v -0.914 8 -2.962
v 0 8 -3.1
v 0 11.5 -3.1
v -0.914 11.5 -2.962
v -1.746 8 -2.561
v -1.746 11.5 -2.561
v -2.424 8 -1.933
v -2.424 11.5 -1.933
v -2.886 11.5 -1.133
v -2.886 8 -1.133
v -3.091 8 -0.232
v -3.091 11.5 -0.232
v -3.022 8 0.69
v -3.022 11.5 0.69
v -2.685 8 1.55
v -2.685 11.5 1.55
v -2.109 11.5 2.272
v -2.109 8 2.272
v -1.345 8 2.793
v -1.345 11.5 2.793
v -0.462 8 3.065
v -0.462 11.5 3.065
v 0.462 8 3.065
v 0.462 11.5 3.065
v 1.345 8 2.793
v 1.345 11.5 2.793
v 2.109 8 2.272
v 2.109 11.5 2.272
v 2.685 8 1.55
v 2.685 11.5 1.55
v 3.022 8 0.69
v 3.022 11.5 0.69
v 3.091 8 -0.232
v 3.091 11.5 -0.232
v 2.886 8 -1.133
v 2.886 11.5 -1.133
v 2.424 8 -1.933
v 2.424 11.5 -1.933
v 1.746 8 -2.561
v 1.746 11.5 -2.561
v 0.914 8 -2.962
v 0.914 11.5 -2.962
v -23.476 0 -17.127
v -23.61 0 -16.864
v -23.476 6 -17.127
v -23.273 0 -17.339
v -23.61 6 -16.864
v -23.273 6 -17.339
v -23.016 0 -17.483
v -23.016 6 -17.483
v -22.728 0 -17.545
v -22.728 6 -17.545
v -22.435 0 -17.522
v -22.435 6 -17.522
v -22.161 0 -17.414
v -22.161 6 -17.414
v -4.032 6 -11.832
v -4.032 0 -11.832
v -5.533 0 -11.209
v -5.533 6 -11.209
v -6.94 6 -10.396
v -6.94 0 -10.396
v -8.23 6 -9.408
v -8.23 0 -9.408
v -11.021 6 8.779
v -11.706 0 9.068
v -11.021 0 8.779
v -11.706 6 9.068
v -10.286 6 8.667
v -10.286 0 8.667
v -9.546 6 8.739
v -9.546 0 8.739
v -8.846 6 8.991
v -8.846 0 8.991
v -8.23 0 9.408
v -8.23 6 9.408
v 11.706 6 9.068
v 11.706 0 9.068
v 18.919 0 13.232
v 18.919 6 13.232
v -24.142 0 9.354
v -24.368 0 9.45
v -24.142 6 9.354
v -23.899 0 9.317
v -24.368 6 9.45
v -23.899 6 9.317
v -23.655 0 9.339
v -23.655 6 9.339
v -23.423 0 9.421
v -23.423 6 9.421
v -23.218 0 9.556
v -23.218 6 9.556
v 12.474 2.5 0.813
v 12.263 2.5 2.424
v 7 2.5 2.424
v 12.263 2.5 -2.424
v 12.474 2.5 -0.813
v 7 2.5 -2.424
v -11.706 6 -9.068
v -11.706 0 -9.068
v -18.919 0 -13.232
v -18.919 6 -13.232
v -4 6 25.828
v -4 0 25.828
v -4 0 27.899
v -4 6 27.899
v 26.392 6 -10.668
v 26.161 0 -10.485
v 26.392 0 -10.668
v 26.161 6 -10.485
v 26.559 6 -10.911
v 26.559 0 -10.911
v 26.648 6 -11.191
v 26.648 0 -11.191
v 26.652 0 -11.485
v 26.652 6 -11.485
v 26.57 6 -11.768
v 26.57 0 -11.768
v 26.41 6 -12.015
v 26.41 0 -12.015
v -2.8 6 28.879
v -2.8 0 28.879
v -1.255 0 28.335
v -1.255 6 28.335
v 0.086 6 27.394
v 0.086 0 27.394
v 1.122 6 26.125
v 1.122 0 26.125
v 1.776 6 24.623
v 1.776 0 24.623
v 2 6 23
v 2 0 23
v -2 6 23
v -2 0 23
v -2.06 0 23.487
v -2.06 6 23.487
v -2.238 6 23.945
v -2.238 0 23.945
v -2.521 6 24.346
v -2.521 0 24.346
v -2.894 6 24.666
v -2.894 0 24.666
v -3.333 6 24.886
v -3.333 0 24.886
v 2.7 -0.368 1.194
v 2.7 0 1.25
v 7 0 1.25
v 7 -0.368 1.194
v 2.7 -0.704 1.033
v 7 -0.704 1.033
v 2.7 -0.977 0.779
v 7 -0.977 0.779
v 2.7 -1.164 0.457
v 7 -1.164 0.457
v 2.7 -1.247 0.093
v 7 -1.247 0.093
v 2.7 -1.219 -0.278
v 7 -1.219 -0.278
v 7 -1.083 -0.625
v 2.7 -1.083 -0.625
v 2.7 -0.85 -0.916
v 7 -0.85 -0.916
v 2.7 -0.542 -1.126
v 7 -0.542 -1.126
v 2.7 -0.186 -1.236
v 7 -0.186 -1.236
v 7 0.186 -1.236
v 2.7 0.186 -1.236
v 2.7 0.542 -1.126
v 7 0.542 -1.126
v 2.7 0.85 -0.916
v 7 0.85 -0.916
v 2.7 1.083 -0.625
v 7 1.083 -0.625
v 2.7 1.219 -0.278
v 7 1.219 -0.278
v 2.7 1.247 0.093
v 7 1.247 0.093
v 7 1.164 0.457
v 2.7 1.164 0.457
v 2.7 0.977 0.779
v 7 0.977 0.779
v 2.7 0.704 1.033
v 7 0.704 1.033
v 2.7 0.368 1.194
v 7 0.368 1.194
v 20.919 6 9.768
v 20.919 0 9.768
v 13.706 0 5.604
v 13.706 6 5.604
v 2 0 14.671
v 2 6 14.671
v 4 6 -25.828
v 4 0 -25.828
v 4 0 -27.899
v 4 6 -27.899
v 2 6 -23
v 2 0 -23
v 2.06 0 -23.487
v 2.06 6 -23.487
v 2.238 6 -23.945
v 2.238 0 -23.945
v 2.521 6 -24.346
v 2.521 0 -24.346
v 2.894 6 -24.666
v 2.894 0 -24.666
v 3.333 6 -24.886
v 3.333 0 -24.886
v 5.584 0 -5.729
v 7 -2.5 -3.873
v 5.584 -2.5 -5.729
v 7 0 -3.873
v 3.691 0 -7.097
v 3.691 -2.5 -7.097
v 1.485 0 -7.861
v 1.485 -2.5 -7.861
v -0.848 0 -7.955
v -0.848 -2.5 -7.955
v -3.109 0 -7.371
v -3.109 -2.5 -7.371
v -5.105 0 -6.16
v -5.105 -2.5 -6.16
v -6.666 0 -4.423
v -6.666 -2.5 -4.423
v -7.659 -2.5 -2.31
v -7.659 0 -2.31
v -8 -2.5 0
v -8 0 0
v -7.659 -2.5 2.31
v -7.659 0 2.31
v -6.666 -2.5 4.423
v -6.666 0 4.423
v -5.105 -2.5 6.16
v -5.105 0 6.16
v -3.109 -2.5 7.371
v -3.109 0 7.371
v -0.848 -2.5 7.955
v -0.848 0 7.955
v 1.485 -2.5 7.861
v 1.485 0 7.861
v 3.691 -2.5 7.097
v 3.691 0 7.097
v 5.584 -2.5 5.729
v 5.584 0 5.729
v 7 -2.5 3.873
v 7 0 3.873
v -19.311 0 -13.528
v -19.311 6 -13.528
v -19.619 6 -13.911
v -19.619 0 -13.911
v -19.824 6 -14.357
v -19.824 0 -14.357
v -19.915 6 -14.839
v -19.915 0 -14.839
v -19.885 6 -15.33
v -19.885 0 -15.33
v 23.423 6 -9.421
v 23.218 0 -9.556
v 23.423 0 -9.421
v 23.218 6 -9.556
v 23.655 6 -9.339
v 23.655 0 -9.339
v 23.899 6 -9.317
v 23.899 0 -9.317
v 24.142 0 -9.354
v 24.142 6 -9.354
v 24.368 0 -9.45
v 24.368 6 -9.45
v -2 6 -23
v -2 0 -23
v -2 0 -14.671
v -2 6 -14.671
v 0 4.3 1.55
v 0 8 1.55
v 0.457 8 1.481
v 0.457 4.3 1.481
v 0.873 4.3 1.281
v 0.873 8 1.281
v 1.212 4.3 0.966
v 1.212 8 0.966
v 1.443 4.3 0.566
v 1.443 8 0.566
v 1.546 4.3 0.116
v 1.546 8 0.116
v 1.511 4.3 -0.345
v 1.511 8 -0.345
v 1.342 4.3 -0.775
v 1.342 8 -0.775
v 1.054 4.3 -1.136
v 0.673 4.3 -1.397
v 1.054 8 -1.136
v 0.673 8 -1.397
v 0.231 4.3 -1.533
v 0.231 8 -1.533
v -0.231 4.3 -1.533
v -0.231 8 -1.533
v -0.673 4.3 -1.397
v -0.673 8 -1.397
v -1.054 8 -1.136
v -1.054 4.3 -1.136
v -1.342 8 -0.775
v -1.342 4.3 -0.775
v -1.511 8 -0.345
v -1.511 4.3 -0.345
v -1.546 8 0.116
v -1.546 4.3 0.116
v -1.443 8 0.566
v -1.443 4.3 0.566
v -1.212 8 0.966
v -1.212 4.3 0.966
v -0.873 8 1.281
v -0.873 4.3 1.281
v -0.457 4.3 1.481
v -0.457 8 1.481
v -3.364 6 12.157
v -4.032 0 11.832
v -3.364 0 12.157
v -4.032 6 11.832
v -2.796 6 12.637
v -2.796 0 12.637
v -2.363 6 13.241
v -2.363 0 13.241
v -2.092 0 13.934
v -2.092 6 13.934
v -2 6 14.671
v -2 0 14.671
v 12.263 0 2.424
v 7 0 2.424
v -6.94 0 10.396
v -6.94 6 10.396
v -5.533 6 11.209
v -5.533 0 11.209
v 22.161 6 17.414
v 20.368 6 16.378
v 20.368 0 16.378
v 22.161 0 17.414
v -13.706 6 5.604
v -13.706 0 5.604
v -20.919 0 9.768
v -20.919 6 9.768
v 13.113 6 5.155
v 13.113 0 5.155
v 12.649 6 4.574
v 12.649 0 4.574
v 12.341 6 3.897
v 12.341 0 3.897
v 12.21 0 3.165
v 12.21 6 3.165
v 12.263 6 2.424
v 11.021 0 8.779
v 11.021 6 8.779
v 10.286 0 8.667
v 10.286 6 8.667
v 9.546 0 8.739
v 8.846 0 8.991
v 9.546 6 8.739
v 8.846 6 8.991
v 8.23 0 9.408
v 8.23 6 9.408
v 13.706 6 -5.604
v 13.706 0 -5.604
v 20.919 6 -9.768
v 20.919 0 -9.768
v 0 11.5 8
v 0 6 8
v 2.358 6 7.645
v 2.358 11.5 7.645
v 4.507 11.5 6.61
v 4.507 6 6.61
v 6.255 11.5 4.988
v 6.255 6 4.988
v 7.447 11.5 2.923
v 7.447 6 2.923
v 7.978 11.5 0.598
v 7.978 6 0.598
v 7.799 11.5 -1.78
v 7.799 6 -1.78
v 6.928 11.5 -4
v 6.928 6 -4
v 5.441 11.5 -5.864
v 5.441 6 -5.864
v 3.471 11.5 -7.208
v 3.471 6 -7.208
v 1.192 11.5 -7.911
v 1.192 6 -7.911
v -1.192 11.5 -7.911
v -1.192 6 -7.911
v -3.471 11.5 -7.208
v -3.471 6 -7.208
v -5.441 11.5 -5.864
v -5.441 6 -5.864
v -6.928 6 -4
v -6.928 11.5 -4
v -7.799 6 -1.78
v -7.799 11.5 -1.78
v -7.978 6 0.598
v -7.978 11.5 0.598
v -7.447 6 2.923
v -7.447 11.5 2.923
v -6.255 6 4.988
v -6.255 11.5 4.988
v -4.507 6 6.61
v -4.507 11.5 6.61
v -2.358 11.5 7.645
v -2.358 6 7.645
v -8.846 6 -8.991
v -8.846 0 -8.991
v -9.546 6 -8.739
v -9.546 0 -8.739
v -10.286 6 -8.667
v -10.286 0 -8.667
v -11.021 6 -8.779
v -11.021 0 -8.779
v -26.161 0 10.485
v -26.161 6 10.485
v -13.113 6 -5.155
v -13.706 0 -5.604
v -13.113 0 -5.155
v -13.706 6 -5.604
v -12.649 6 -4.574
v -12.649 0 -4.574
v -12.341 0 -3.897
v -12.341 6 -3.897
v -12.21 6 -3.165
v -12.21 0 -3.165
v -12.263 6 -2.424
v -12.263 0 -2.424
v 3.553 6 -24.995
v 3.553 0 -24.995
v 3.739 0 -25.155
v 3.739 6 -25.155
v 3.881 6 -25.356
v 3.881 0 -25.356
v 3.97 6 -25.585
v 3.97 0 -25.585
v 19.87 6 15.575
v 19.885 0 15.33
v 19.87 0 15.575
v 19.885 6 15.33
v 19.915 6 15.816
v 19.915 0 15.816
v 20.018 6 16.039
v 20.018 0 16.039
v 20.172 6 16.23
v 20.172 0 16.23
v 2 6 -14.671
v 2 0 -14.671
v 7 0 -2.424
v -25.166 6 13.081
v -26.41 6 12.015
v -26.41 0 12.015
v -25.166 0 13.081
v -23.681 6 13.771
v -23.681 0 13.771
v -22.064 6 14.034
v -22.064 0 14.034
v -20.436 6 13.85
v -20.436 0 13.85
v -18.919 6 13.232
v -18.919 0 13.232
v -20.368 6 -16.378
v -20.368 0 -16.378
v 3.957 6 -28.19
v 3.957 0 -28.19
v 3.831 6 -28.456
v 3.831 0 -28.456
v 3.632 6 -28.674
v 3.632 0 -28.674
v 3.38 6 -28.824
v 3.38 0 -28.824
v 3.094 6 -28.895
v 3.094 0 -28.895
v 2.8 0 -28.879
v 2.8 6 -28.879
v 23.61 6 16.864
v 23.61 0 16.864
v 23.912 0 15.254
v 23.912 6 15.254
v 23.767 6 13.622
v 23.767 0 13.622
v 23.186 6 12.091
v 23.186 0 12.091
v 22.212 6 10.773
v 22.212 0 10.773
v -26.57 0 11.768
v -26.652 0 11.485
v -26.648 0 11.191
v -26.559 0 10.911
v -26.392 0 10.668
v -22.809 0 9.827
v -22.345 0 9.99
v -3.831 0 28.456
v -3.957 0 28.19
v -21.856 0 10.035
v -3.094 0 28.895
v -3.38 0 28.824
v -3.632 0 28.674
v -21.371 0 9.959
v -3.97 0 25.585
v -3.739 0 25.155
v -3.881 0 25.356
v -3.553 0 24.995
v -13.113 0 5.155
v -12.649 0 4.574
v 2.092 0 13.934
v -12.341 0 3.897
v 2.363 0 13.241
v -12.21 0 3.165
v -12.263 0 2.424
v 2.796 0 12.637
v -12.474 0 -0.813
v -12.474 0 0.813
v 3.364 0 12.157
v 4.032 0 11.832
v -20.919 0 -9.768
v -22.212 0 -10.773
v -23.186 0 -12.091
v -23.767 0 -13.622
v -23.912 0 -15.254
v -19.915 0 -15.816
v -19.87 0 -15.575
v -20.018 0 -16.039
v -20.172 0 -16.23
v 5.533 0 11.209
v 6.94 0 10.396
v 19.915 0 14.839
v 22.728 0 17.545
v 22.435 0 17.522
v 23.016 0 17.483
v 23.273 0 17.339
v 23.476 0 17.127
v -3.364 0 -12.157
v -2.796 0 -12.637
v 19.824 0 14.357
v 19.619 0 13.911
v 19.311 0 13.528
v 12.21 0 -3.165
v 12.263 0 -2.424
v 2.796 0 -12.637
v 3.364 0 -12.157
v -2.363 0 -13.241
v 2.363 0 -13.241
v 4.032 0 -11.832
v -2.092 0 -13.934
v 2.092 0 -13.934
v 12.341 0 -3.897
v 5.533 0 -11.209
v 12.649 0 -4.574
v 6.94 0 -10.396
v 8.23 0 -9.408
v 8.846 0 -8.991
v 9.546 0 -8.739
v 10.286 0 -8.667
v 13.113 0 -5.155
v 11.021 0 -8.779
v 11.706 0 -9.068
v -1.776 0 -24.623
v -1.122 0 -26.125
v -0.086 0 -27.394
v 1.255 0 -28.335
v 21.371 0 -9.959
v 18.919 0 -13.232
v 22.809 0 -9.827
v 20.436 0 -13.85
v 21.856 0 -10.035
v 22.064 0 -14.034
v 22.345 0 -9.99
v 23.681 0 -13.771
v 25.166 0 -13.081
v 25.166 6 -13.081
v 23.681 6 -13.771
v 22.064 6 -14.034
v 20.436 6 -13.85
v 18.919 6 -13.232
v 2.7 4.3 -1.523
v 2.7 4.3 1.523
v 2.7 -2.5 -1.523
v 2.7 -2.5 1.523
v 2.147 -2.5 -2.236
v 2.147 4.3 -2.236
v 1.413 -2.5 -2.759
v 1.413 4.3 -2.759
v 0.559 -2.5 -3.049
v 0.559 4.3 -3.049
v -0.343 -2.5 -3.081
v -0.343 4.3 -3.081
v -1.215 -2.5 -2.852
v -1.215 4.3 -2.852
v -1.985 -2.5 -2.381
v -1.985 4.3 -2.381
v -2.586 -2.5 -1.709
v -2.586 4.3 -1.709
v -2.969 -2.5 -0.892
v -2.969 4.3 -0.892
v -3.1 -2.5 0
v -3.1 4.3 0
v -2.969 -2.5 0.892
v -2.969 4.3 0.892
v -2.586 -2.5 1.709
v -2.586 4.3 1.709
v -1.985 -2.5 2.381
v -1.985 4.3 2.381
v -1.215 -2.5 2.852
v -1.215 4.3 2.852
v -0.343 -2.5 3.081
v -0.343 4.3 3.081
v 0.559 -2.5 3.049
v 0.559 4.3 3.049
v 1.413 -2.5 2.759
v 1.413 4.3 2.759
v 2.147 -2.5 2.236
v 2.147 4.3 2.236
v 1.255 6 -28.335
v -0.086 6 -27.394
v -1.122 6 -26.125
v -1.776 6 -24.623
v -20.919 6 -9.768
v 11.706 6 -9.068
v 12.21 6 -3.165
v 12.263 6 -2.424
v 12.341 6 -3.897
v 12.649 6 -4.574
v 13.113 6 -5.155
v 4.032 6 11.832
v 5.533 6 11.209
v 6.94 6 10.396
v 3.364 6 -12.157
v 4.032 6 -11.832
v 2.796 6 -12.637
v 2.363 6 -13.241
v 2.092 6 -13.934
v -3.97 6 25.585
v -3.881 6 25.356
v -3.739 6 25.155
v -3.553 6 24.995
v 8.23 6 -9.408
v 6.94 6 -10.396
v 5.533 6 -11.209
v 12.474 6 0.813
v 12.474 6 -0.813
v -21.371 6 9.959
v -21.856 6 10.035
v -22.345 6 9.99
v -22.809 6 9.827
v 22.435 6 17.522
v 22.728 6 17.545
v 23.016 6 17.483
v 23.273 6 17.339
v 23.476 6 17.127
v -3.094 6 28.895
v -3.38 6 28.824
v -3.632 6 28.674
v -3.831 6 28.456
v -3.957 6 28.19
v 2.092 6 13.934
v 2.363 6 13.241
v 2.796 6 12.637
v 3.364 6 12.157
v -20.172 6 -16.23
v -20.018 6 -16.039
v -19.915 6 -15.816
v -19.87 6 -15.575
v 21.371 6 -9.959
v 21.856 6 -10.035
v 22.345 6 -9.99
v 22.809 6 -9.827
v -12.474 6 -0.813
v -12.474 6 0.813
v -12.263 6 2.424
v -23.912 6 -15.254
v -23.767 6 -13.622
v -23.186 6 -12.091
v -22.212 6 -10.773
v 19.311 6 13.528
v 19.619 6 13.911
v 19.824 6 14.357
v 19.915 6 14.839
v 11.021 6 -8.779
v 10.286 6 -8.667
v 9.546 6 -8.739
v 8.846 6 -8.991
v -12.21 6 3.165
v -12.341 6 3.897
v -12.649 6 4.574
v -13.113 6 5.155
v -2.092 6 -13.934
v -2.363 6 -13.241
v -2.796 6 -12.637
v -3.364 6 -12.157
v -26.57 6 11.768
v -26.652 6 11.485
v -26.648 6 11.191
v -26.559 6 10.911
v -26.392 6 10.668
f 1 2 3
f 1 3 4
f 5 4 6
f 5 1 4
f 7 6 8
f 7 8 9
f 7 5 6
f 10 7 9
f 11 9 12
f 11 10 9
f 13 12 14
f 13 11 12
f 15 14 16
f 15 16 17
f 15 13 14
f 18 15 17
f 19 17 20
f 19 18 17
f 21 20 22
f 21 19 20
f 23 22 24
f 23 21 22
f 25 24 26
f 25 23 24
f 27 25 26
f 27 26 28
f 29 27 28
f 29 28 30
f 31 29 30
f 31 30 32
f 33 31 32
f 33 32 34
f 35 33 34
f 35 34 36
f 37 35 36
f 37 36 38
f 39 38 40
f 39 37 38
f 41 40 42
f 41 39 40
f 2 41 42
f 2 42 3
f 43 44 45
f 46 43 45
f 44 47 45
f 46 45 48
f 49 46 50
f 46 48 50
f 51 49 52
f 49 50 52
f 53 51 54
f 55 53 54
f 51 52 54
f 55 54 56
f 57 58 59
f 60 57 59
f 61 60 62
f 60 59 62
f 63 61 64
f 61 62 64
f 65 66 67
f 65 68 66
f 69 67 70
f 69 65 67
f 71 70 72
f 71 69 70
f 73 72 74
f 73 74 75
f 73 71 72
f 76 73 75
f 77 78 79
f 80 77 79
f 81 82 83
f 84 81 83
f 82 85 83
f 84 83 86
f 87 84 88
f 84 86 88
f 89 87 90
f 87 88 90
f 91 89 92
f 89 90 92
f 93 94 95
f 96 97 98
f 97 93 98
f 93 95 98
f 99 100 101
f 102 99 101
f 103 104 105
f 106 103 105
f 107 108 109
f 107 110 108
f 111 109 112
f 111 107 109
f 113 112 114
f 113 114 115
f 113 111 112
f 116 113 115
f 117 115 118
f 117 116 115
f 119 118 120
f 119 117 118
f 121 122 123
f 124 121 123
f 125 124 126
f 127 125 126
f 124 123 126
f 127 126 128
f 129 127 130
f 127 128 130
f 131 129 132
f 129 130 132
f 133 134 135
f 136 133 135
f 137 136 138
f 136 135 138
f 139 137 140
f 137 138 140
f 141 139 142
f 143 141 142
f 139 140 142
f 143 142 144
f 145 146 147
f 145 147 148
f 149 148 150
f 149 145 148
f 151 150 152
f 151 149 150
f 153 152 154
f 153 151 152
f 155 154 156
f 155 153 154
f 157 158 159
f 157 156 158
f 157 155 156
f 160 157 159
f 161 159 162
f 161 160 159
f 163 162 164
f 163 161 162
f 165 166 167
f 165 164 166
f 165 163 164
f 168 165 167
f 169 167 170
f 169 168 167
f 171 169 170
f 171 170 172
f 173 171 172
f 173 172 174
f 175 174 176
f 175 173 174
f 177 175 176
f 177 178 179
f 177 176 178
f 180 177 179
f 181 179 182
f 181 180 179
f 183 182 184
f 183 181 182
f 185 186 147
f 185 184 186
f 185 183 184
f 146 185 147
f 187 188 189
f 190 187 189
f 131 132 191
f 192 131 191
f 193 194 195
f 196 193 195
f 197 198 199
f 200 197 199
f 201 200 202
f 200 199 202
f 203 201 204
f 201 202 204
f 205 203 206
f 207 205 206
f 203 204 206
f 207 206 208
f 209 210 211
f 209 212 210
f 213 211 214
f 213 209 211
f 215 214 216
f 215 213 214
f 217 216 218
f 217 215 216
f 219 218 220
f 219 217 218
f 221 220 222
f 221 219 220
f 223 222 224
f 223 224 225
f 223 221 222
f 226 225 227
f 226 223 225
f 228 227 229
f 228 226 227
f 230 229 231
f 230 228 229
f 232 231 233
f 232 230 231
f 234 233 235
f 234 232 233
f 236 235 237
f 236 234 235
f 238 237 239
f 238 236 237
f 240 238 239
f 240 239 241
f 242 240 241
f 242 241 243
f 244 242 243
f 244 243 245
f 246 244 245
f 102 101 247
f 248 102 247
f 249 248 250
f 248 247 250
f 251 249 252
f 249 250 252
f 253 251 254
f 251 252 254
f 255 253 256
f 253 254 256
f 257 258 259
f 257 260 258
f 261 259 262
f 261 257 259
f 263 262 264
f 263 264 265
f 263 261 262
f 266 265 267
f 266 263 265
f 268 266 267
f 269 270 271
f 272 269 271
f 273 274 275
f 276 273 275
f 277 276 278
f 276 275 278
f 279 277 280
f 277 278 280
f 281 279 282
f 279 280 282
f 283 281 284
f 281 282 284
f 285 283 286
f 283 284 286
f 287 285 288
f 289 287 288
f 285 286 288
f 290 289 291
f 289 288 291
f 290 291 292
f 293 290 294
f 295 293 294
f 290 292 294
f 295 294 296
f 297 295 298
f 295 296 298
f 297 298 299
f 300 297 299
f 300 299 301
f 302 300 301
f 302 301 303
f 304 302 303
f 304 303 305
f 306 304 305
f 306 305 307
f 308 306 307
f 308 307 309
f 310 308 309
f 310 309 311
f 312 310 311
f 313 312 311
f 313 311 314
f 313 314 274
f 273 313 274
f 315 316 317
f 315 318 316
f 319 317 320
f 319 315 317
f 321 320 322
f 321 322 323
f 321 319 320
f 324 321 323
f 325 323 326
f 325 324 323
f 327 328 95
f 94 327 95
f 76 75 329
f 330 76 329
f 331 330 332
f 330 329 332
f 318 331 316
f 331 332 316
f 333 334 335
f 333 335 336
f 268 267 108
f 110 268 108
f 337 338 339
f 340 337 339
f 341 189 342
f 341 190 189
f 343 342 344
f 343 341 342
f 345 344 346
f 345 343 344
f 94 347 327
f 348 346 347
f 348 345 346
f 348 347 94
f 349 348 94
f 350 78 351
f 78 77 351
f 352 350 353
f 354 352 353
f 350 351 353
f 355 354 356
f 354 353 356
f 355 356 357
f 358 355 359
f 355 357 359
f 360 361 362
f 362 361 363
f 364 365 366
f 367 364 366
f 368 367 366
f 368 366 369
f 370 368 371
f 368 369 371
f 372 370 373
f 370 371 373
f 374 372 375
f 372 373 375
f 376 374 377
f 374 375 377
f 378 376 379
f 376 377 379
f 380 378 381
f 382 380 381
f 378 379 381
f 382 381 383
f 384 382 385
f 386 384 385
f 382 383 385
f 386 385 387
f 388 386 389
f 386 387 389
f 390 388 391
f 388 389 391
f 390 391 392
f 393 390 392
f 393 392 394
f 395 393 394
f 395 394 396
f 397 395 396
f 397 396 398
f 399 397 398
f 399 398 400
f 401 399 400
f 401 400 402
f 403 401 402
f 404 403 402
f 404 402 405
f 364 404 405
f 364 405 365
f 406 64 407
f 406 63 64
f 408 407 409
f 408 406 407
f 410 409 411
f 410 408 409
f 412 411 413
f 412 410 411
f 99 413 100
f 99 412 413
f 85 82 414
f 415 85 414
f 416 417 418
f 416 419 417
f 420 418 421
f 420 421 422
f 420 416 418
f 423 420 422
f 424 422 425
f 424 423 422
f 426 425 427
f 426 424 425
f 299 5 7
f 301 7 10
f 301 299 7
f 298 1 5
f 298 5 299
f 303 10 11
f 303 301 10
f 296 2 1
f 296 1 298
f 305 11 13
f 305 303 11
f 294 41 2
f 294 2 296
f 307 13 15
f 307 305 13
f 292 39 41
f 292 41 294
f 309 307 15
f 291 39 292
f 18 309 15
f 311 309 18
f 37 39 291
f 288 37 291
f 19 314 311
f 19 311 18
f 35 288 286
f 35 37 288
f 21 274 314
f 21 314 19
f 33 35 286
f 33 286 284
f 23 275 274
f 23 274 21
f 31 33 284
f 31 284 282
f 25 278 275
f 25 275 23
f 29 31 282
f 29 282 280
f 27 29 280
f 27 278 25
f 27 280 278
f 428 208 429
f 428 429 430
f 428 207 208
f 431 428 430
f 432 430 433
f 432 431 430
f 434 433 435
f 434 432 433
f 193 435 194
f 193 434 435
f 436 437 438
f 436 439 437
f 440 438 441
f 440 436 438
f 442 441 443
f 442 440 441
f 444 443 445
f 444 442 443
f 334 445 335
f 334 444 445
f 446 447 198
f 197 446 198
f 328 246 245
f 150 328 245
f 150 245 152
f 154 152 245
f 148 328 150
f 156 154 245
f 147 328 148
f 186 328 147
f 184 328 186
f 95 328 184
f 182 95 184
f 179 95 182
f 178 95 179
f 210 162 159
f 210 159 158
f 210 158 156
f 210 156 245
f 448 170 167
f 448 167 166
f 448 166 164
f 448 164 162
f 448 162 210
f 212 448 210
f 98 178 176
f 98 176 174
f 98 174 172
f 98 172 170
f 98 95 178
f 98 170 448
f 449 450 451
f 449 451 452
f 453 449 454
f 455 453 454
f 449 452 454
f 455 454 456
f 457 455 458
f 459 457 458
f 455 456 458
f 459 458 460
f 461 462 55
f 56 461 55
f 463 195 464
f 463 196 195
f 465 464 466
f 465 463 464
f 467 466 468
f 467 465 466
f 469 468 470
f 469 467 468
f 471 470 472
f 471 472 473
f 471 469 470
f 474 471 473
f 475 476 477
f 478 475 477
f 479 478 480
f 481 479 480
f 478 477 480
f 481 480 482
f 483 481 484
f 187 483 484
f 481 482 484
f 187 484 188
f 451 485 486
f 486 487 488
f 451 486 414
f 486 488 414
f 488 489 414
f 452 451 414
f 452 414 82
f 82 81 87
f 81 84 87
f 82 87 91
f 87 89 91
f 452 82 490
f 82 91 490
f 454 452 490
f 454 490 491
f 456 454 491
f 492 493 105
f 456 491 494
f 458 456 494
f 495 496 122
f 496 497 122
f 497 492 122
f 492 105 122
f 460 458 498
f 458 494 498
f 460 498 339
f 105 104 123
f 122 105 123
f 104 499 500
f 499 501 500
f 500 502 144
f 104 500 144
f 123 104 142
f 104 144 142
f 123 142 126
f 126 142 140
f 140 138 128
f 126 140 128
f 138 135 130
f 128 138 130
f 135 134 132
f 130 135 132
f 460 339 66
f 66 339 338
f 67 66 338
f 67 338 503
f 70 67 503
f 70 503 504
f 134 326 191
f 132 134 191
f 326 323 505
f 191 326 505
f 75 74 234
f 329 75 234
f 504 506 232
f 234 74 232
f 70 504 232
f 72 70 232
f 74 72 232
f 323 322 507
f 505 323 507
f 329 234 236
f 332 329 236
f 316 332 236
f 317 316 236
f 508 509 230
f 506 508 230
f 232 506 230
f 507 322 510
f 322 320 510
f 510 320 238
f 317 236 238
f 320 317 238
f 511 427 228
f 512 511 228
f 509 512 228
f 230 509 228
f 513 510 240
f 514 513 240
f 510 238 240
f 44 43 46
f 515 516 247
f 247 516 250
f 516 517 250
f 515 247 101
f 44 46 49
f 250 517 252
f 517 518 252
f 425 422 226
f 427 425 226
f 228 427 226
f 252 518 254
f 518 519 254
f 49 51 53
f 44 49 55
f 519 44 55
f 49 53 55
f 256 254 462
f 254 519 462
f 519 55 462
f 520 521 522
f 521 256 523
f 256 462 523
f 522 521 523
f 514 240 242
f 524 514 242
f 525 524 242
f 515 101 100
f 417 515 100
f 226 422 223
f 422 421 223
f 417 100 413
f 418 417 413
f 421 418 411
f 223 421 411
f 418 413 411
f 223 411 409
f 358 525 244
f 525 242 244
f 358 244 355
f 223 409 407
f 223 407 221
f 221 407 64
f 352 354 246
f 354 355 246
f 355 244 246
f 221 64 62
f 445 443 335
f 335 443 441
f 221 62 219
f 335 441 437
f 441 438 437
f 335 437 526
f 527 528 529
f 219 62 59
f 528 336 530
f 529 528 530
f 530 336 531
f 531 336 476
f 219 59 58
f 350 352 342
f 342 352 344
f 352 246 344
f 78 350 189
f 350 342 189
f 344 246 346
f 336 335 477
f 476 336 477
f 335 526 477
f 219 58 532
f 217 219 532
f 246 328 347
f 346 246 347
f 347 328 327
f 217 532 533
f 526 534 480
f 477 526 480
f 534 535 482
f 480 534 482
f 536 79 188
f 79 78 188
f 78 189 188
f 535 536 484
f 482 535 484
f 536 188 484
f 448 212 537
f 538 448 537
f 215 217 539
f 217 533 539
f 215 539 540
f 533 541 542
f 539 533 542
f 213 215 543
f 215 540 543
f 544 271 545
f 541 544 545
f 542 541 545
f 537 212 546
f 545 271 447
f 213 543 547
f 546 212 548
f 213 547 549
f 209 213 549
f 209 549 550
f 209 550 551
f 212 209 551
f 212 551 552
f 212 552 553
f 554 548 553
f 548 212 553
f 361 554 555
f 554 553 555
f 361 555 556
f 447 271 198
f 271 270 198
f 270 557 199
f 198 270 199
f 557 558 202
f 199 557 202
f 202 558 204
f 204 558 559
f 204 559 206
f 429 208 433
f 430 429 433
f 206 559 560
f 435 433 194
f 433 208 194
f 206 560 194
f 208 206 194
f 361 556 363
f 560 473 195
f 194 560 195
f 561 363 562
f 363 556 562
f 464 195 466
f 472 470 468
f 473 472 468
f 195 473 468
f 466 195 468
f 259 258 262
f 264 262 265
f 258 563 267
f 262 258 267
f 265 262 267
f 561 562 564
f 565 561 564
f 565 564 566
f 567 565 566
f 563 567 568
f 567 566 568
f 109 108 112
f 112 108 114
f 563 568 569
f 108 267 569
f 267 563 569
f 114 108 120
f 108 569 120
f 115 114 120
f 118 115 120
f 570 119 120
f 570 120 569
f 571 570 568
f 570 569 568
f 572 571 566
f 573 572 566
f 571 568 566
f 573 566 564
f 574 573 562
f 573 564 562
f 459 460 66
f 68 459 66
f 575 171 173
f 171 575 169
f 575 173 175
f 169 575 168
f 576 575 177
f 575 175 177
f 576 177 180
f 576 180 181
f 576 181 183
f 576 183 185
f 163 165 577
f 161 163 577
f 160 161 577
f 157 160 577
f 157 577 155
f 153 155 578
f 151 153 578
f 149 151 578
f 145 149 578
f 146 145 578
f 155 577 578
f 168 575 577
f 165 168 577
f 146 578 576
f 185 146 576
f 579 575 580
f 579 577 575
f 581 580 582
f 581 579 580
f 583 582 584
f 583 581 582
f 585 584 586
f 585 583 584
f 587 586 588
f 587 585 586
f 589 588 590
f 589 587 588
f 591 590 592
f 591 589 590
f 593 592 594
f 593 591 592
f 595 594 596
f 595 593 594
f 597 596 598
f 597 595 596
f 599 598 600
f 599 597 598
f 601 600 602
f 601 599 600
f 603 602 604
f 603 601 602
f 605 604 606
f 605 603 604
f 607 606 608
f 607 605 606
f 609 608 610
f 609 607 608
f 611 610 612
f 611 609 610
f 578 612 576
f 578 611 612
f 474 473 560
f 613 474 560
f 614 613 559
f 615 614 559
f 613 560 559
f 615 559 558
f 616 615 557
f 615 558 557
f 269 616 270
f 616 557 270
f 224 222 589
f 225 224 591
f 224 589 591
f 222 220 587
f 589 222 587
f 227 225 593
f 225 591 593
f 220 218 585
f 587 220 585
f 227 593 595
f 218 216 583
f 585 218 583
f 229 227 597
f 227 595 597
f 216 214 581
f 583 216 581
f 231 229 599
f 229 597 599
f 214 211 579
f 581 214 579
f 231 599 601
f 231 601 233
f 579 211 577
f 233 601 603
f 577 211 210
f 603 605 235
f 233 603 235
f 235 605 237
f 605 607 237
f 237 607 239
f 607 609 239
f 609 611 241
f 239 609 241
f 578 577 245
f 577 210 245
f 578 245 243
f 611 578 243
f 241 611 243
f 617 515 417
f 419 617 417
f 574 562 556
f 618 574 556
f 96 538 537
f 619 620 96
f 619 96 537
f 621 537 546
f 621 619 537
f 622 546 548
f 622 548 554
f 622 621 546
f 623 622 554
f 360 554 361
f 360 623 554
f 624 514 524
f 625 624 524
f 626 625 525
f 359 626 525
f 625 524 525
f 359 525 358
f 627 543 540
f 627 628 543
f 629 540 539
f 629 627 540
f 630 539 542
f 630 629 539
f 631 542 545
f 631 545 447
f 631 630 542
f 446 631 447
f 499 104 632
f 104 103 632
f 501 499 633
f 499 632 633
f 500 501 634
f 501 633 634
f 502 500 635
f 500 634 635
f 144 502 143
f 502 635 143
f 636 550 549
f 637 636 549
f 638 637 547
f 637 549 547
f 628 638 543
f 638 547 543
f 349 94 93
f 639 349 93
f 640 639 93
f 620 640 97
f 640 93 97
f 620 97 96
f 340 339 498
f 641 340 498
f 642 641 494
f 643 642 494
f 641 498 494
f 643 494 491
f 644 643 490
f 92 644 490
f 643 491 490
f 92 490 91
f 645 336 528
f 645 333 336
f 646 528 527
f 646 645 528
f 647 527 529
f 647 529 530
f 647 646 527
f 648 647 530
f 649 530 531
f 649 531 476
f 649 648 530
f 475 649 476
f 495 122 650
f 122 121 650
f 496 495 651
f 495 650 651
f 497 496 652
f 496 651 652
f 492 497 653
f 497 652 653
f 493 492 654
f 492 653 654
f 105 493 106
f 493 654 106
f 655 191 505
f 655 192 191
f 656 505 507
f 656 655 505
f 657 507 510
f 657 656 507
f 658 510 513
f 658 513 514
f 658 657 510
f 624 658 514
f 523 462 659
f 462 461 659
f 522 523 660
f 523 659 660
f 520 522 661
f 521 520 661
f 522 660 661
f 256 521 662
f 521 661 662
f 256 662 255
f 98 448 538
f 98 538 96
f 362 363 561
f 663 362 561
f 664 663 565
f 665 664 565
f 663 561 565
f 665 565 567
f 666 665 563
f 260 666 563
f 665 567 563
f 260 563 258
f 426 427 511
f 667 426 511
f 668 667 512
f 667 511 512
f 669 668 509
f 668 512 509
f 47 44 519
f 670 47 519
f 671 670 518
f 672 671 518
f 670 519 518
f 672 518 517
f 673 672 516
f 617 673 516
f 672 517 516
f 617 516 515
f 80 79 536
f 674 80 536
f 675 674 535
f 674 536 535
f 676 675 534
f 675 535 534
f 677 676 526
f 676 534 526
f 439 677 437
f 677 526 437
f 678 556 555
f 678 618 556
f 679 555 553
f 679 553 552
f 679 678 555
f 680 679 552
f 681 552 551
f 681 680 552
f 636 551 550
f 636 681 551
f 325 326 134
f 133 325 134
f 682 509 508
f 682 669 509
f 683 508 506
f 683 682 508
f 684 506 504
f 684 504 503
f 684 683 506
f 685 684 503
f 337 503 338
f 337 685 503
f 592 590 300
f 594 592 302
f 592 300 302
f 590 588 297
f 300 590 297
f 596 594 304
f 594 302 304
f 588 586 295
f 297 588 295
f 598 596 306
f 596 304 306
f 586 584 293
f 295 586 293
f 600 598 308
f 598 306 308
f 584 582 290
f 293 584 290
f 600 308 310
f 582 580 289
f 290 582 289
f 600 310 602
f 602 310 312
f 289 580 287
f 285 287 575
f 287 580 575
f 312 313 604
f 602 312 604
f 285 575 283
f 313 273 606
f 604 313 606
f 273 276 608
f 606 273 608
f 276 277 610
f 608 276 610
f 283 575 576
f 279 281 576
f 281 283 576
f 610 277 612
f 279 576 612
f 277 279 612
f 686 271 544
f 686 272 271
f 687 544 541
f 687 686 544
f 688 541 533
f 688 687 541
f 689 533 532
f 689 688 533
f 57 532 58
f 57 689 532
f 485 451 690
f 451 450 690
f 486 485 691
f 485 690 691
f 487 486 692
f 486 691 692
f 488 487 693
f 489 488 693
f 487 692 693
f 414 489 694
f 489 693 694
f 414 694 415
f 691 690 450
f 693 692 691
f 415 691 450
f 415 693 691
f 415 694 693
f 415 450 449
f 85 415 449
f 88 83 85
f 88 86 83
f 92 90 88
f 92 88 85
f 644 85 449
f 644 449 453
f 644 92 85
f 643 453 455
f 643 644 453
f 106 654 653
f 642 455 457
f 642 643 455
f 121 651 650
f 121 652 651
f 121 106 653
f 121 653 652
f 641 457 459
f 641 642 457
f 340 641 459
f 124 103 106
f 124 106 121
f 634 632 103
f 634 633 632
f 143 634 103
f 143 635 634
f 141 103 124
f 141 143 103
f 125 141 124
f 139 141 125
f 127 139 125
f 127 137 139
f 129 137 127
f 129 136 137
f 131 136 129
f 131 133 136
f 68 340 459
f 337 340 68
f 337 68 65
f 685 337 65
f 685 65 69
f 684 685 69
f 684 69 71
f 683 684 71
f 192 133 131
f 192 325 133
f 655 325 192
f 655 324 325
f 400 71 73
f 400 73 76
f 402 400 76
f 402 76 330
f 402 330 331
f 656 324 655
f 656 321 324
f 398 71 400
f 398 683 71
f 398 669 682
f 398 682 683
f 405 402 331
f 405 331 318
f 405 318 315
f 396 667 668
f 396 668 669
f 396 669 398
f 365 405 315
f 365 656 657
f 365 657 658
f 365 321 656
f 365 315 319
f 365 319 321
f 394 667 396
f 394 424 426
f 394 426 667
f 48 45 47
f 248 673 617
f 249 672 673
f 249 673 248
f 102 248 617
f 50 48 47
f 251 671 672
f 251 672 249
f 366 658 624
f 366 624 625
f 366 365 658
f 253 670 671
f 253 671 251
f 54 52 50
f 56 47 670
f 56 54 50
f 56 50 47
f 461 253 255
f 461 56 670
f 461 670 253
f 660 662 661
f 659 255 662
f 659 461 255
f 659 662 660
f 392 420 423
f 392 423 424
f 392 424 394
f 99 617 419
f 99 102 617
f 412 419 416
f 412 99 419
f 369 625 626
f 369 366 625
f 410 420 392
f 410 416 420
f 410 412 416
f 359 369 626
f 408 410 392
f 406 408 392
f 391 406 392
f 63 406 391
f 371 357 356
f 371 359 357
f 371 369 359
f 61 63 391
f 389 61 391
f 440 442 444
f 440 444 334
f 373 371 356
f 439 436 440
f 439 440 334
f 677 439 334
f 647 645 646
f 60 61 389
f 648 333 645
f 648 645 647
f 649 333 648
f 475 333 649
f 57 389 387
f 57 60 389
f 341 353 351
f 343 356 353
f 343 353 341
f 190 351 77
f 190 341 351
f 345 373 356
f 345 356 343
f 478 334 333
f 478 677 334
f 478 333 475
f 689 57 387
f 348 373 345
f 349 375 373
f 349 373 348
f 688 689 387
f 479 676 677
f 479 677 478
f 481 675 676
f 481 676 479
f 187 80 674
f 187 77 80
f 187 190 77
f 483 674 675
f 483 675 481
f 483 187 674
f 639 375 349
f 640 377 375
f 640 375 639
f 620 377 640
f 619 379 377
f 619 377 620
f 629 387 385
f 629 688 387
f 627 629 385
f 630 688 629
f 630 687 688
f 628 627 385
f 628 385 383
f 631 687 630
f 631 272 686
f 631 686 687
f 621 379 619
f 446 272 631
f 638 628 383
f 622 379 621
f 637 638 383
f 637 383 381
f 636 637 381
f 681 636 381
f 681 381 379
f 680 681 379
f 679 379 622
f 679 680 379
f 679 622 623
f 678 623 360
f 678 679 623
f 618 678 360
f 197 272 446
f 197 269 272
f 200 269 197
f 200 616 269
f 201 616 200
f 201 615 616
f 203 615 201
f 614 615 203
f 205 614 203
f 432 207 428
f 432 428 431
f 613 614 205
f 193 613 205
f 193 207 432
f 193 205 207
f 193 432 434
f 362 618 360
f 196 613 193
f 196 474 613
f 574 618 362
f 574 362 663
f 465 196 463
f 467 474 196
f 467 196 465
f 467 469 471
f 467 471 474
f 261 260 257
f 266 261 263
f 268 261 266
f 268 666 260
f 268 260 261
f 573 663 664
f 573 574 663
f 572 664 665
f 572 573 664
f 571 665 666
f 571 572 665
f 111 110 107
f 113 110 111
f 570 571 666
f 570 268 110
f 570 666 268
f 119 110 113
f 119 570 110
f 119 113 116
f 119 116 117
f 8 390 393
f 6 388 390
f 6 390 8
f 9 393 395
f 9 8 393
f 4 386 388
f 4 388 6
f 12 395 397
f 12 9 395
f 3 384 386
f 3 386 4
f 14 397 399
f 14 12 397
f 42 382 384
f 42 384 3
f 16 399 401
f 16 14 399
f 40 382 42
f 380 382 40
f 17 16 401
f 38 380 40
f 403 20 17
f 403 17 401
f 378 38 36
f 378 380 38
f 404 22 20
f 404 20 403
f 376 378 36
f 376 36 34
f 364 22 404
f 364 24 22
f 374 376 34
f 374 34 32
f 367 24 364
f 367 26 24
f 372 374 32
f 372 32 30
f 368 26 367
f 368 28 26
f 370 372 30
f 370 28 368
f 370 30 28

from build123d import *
from build123d.topology import SkipClean

# Parameters (mm, degrees)
EXTRUDE_1_DEPTH      = 6
FILLET_1_R           = 3
FILLET_2_R           = 1
SKETCH_2_R           = 8
EXTRUDE_2_DEPTH      = 2.5
SKETCH_3_R           = 3.1
CUT_EXTRUDE_1_DEPTH  = 41.227129309
SKETCH_5_R           = 8
SKETCH_5_R_2         = 3.1
EXTRUDE_3_DEPTH      = 1.5
SKETCH_6_R           = 8
SKETCH_6_R_2         = 1.25
EXTRUDE_4_DEPTH      = 0.5
SKETCH_7_R           = 8
SKETCH_7_R_2         = 3.1
EXTRUDE_5_DEPTH      = 3.5
EXTRUDE_START        = -3.2
SKETCH_6_2_R         = 8
SKETCH_6_2_R_2       = 1.25
EXTRUDE_6_DEPTH      = 3.2
SKETCH_12_W          = 16
SKETCH_12_H          = 5
CUT_EXTRUDE_7_DEPTH  = 46.830983865
EXTRUDE_7_REACH      = 43.737
SKETCH_16_W          = 0.8
SKETCH_16_H          = 4
SKETCH_14_R          = 1.25
CUT_EXTRUDE_8_DEPTH  = 41.966107118
SKETCH_15_W          = 4.847698962
SKETCH_15_H          = 5
CUT_EXTRUDE_9_DEPTH  = 46.830983865
CUT_EXTRUDE_10_REACH = 42.697
SKETCH_17_R          = 1.55


with BuildPart() as part:
    # 草图1 → 凸台-拉伸1 (new body)
    with BuildSketch(Plane(origin=(0, 0, 0), x_dir=(1, 0, 0), z_dir=(0, 1, 0))):
        with BuildLine():
            Line((2, 12.338962679), (2, 23))
            ThreePointArc((2, 23), (2.585786438, 24.414213562), (4, 25))
            Line((4, 25), (4, 29))
            ThreePointArc((4, 29), (-0.242640687, 27.242640687), (-2, 23))
            Line((-2, 23), (-2, 12.338962679))
            ThreePointArc((-2, 12.338962679), (-6.25, 10.825317547), (-9.685855137, 7.901532147))
            Line((-9.685855137, 7.901532147), (-18.918584287, 13.232050808))
            ThreePointArc((-18.918584287, 13.232050808), (-19.85043594, 14.446463525), (-19.650635095, 15.964101615))
            Line((-19.650635095, 15.964101615), (-23.11473671, 17.964101615))
            ThreePointArc((-23.11473671, 17.964101615), (-23.714139245, 13.411187345), (-20.918584287, 9.767949192))
            Line((-20.918584287, 9.767949192), (-11.685855137, 4.437430532))
            ThreePointArc((-11.685855137, 4.437430532), (-12.5, 0), (-11.685855137, -4.437430532))
            Line((-11.685855137, -4.437430532), (-20.918584287, -9.767949192))
            ThreePointArc((-20.918584287, -9.767949192), (-22.436222377, -9.967750037), (-23.650635095, -9.035898385))
            Line((-23.650635095, -9.035898385), (-27.11473671, -11.035898385))
            ThreePointArc((-27.11473671, -11.035898385), (-23.471498558, -13.831453343), (-18.918584287, -13.232050808))
            Line((-18.918584287, -13.232050808), (-9.685855137, -7.901532147))
            ThreePointArc((-9.685855137, -7.901532147), (-6.25, -10.825317547), (-2, -12.338962679))
            Line((-2, -12.338962679), (-2, -23))
            ThreePointArc((-2, -23), (-2.585786438, -24.414213562), (-4, -25))
            Line((-4, -25), (-4, -29))
            ThreePointArc((-4, -29), (0.242640687, -27.242640687), (2, -23))
            Line((2, -23), (2, -12.338962679))
            ThreePointArc((2, -12.338962679), (6.25, -10.825317547), (9.685855137, -7.901532147))
            Line((9.685855137, -7.901532147), (18.918584287, -13.232050808))
            ThreePointArc((18.918584287, -13.232050808), (19.85043594, -14.446463525), (19.650635095, -15.964101615))
            Line((19.650635095, -15.964101615), (23.11473671, -17.964101615))
            ThreePointArc((23.11473671, -17.964101615), (23.714139245, -13.411187345), (20.918584287, -9.767949192))
            Line((20.918584287, -9.767949192), (11.685855137, -4.437430532))
            ThreePointArc((11.685855137, -4.437430532), (12.5, 0), (11.685855137, 4.437430532))
            Line((11.685855137, 4.437430532), (20.918584287, 9.767949192))
            ThreePointArc((20.918584287, 9.767949192), (22.436222377, 9.967750037), (23.650635095, 9.035898385))
            Line((23.650635095, 9.035898385), (27.11473671, 11.035898385))
            ThreePointArc((27.11473671, 11.035898385), (23.471498558, 13.831453343), (18.918584287, 13.232050808))
            Line((18.918584287, 13.232050808), (9.685855137, 7.901532147))
            ThreePointArc((9.685855137, 7.901532147), (6.25, 10.825317547), (2, 12.338962679))
        make_face()
    extrude(amount=EXTRUDE_1_DEPTH)

    # 圆角1
    fillet_1_edges = [part.edges().sort_by_distance(p)[0] for p in [
        (9.685855137, 3, -7.901532147),
        (2, 3, -12.338962679),
        (-2, 3, -12.338962679),
        (-9.685855137, 3, -7.901532147),
        (-11.685855137, 3, -4.437430532),
        (-11.685855137, 3, 4.437430532),
        (-9.685855137, 3, 7.901532147),
        (-2, 3, 12.338962679),
        (2, 3, 12.338962679),
        (11.685855137, 3, 4.437430532),
        (9.685855137, 3, 7.901532147),
        (11.685855137, 3, -4.437430532),
    ]]
    fillet(fillet_1_edges, radius=FILLET_1_R)

    # 圆角2
    fillet_2_edges = [part.edges().sort_by_distance(p)[0] for p in [
        (-4, 3, 25),
        (-27.11473671, 3, 11.035898385),
        (-23.650635095, 3, 9.035898385),
        (-23.11473671, 3, -17.964101615),
        (-19.650635095, 3, -15.964101615),
        (4, 3, -29),
        (4, 3, -25),
        (27.11473671, 3, -11.035898385),
        (23.650635095, 3, -9.035898385),
        (19.650635095, 3, 15.964101615),
        (23.11473671, 3, 17.964101615),
        (-4, 3, 29),
    ]]
    fillet(fillet_2_edges, radius=FILLET_2_R)

    # 草图2 → 凸台-拉伸2 (add)
    with BuildSketch(Plane(origin=(0, 0, 0), x_dir=(1, 0, 0), z_dir=(0, 1, 0))):
        Circle(SKETCH_2_R)
    extrude(amount=-EXTRUDE_2_DEPTH)

    # 草图3 → 切除-拉伸1 (cut, through all)
    with BuildSketch(Plane(origin=(0, -2.5, 0), x_dir=(-1, 0, 0), z_dir=(0, -1, 0))):
        Circle(SKETCH_3_R)
    extrude(amount=-CUT_EXTRUDE_1_DEPTH, mode=Mode.SUBTRACT)

    # 草图5 → 凸台-拉伸3 (add)
    with SkipClean():  # the faces are left unmerged after this step: merging them gives an invalid solid
        with BuildSketch(Plane(origin=(0, 6, 0), x_dir=(1, 0, 0), z_dir=(0, 1, 0))):
            Circle(SKETCH_5_R)
            Circle(SKETCH_5_R_2, mode=Mode.SUBTRACT)
        extrude(amount=EXTRUDE_3_DEPTH)

    # 草图6 → 凸台-拉伸4 (add)
    with SkipClean():  # the faces are left unmerged after this step: merging them gives an invalid solid
        with BuildSketch(Plane(origin=(0, 7.5, 0), x_dir=(1, 0, 0), z_dir=(0, 1, 0))):
            Circle(SKETCH_6_R)
            Circle(SKETCH_6_R_2, mode=Mode.SUBTRACT)
        extrude(amount=EXTRUDE_4_DEPTH)

    # 草图7 → 凸台-拉伸5 (add)
    with SkipClean():  # the faces are left unmerged after this step: merging them gives an invalid solid
        with BuildSketch(Plane(origin=(0, 8, 0), x_dir=(1, 0, 0), z_dir=(0, 1, 0))):
            Circle(SKETCH_7_R)
            Circle(SKETCH_7_R_2, mode=Mode.SUBTRACT)
        extrude(amount=EXTRUDE_5_DEPTH)

    # 草图6<2> → 凸台-拉伸6 (add)
    with BuildSketch(Plane(origin=(0, 7.5, 0), x_dir=(1, 0, 0), z_dir=(0, 1, 0)).offset(EXTRUDE_START)):
        Circle(SKETCH_6_2_R)
        Circle(SKETCH_6_2_R_2, mode=Mode.SUBTRACT)
    extrude(amount=EXTRUDE_6_DEPTH)

    # 草图12 → 切除-拉伸7 (cut, through all)
    with BuildSketch(Plane(origin=(7, 0, 0), x_dir=(0, 0, -1), z_dir=(1, 0, 0))):
        with Locations((0, -2.5)):
            Rectangle(SKETCH_12_W, SKETCH_12_H)
    extrude(amount=CUT_EXTRUDE_7_DEPTH, mode=Mode.SUBTRACT)

    # 草图16 → 凸台-拉伸7 (add, up to next)
    with BuildSketch(Plane.XZ.offset(2.5), mode=Mode.PRIVATE) as extrude_7_sk1:
        with Locations((3.1, 0)):
            Rectangle(SKETCH_16_W, SKETCH_16_H)
    extrude_7_tool1 = extrude(extrude_7_sk1.sketch, amount=-EXTRUDE_7_REACH, mode=Mode.PRIVATE) - part.part
    add(extrude_7_tool1.solids().sort_by_distance((3.1, -2.5, 0))[0])

    # 草图14 → 切除-拉伸8 (cut, through all)
    with BuildSketch(Plane(origin=(0, 0, 0), x_dir=(0, 0, -1), z_dir=(1, 0, 0))):
        Circle(SKETCH_14_R)
    extrude(amount=CUT_EXTRUDE_8_DEPTH, mode=Mode.SUBTRACT)

    # 草图15 → 切除-拉伸9 (cut, through all)
    with BuildSketch(Plane(origin=(7, 0, 0), x_dir=(0, 0, -1), z_dir=(1, 0, 0))):
        Rectangle(SKETCH_15_W, SKETCH_15_H)
    extrude(amount=CUT_EXTRUDE_9_DEPTH, mode=Mode.SUBTRACT)

    # 草图17 → 切除-拉伸10 (cut, up to next)
    with BuildSketch(Plane(origin=(0, 8, 0), x_dir=(1, 0, 0), z_dir=(0, 1, 0)), mode=Mode.PRIVATE) as cut_extrude_10_sk1:
        Circle(SKETCH_17_R)
    cut_extrude_10_tool1 = extrude(cut_extrude_10_sk1.sketch, amount=-CUT_EXTRUDE_10_REACH, mode=Mode.PRIVATE) & part.part
    add(cut_extrude_10_tool1.solids().sort_by_distance((0, 8, 0))[0], mode=Mode.SUBTRACT)


solid = part.part
